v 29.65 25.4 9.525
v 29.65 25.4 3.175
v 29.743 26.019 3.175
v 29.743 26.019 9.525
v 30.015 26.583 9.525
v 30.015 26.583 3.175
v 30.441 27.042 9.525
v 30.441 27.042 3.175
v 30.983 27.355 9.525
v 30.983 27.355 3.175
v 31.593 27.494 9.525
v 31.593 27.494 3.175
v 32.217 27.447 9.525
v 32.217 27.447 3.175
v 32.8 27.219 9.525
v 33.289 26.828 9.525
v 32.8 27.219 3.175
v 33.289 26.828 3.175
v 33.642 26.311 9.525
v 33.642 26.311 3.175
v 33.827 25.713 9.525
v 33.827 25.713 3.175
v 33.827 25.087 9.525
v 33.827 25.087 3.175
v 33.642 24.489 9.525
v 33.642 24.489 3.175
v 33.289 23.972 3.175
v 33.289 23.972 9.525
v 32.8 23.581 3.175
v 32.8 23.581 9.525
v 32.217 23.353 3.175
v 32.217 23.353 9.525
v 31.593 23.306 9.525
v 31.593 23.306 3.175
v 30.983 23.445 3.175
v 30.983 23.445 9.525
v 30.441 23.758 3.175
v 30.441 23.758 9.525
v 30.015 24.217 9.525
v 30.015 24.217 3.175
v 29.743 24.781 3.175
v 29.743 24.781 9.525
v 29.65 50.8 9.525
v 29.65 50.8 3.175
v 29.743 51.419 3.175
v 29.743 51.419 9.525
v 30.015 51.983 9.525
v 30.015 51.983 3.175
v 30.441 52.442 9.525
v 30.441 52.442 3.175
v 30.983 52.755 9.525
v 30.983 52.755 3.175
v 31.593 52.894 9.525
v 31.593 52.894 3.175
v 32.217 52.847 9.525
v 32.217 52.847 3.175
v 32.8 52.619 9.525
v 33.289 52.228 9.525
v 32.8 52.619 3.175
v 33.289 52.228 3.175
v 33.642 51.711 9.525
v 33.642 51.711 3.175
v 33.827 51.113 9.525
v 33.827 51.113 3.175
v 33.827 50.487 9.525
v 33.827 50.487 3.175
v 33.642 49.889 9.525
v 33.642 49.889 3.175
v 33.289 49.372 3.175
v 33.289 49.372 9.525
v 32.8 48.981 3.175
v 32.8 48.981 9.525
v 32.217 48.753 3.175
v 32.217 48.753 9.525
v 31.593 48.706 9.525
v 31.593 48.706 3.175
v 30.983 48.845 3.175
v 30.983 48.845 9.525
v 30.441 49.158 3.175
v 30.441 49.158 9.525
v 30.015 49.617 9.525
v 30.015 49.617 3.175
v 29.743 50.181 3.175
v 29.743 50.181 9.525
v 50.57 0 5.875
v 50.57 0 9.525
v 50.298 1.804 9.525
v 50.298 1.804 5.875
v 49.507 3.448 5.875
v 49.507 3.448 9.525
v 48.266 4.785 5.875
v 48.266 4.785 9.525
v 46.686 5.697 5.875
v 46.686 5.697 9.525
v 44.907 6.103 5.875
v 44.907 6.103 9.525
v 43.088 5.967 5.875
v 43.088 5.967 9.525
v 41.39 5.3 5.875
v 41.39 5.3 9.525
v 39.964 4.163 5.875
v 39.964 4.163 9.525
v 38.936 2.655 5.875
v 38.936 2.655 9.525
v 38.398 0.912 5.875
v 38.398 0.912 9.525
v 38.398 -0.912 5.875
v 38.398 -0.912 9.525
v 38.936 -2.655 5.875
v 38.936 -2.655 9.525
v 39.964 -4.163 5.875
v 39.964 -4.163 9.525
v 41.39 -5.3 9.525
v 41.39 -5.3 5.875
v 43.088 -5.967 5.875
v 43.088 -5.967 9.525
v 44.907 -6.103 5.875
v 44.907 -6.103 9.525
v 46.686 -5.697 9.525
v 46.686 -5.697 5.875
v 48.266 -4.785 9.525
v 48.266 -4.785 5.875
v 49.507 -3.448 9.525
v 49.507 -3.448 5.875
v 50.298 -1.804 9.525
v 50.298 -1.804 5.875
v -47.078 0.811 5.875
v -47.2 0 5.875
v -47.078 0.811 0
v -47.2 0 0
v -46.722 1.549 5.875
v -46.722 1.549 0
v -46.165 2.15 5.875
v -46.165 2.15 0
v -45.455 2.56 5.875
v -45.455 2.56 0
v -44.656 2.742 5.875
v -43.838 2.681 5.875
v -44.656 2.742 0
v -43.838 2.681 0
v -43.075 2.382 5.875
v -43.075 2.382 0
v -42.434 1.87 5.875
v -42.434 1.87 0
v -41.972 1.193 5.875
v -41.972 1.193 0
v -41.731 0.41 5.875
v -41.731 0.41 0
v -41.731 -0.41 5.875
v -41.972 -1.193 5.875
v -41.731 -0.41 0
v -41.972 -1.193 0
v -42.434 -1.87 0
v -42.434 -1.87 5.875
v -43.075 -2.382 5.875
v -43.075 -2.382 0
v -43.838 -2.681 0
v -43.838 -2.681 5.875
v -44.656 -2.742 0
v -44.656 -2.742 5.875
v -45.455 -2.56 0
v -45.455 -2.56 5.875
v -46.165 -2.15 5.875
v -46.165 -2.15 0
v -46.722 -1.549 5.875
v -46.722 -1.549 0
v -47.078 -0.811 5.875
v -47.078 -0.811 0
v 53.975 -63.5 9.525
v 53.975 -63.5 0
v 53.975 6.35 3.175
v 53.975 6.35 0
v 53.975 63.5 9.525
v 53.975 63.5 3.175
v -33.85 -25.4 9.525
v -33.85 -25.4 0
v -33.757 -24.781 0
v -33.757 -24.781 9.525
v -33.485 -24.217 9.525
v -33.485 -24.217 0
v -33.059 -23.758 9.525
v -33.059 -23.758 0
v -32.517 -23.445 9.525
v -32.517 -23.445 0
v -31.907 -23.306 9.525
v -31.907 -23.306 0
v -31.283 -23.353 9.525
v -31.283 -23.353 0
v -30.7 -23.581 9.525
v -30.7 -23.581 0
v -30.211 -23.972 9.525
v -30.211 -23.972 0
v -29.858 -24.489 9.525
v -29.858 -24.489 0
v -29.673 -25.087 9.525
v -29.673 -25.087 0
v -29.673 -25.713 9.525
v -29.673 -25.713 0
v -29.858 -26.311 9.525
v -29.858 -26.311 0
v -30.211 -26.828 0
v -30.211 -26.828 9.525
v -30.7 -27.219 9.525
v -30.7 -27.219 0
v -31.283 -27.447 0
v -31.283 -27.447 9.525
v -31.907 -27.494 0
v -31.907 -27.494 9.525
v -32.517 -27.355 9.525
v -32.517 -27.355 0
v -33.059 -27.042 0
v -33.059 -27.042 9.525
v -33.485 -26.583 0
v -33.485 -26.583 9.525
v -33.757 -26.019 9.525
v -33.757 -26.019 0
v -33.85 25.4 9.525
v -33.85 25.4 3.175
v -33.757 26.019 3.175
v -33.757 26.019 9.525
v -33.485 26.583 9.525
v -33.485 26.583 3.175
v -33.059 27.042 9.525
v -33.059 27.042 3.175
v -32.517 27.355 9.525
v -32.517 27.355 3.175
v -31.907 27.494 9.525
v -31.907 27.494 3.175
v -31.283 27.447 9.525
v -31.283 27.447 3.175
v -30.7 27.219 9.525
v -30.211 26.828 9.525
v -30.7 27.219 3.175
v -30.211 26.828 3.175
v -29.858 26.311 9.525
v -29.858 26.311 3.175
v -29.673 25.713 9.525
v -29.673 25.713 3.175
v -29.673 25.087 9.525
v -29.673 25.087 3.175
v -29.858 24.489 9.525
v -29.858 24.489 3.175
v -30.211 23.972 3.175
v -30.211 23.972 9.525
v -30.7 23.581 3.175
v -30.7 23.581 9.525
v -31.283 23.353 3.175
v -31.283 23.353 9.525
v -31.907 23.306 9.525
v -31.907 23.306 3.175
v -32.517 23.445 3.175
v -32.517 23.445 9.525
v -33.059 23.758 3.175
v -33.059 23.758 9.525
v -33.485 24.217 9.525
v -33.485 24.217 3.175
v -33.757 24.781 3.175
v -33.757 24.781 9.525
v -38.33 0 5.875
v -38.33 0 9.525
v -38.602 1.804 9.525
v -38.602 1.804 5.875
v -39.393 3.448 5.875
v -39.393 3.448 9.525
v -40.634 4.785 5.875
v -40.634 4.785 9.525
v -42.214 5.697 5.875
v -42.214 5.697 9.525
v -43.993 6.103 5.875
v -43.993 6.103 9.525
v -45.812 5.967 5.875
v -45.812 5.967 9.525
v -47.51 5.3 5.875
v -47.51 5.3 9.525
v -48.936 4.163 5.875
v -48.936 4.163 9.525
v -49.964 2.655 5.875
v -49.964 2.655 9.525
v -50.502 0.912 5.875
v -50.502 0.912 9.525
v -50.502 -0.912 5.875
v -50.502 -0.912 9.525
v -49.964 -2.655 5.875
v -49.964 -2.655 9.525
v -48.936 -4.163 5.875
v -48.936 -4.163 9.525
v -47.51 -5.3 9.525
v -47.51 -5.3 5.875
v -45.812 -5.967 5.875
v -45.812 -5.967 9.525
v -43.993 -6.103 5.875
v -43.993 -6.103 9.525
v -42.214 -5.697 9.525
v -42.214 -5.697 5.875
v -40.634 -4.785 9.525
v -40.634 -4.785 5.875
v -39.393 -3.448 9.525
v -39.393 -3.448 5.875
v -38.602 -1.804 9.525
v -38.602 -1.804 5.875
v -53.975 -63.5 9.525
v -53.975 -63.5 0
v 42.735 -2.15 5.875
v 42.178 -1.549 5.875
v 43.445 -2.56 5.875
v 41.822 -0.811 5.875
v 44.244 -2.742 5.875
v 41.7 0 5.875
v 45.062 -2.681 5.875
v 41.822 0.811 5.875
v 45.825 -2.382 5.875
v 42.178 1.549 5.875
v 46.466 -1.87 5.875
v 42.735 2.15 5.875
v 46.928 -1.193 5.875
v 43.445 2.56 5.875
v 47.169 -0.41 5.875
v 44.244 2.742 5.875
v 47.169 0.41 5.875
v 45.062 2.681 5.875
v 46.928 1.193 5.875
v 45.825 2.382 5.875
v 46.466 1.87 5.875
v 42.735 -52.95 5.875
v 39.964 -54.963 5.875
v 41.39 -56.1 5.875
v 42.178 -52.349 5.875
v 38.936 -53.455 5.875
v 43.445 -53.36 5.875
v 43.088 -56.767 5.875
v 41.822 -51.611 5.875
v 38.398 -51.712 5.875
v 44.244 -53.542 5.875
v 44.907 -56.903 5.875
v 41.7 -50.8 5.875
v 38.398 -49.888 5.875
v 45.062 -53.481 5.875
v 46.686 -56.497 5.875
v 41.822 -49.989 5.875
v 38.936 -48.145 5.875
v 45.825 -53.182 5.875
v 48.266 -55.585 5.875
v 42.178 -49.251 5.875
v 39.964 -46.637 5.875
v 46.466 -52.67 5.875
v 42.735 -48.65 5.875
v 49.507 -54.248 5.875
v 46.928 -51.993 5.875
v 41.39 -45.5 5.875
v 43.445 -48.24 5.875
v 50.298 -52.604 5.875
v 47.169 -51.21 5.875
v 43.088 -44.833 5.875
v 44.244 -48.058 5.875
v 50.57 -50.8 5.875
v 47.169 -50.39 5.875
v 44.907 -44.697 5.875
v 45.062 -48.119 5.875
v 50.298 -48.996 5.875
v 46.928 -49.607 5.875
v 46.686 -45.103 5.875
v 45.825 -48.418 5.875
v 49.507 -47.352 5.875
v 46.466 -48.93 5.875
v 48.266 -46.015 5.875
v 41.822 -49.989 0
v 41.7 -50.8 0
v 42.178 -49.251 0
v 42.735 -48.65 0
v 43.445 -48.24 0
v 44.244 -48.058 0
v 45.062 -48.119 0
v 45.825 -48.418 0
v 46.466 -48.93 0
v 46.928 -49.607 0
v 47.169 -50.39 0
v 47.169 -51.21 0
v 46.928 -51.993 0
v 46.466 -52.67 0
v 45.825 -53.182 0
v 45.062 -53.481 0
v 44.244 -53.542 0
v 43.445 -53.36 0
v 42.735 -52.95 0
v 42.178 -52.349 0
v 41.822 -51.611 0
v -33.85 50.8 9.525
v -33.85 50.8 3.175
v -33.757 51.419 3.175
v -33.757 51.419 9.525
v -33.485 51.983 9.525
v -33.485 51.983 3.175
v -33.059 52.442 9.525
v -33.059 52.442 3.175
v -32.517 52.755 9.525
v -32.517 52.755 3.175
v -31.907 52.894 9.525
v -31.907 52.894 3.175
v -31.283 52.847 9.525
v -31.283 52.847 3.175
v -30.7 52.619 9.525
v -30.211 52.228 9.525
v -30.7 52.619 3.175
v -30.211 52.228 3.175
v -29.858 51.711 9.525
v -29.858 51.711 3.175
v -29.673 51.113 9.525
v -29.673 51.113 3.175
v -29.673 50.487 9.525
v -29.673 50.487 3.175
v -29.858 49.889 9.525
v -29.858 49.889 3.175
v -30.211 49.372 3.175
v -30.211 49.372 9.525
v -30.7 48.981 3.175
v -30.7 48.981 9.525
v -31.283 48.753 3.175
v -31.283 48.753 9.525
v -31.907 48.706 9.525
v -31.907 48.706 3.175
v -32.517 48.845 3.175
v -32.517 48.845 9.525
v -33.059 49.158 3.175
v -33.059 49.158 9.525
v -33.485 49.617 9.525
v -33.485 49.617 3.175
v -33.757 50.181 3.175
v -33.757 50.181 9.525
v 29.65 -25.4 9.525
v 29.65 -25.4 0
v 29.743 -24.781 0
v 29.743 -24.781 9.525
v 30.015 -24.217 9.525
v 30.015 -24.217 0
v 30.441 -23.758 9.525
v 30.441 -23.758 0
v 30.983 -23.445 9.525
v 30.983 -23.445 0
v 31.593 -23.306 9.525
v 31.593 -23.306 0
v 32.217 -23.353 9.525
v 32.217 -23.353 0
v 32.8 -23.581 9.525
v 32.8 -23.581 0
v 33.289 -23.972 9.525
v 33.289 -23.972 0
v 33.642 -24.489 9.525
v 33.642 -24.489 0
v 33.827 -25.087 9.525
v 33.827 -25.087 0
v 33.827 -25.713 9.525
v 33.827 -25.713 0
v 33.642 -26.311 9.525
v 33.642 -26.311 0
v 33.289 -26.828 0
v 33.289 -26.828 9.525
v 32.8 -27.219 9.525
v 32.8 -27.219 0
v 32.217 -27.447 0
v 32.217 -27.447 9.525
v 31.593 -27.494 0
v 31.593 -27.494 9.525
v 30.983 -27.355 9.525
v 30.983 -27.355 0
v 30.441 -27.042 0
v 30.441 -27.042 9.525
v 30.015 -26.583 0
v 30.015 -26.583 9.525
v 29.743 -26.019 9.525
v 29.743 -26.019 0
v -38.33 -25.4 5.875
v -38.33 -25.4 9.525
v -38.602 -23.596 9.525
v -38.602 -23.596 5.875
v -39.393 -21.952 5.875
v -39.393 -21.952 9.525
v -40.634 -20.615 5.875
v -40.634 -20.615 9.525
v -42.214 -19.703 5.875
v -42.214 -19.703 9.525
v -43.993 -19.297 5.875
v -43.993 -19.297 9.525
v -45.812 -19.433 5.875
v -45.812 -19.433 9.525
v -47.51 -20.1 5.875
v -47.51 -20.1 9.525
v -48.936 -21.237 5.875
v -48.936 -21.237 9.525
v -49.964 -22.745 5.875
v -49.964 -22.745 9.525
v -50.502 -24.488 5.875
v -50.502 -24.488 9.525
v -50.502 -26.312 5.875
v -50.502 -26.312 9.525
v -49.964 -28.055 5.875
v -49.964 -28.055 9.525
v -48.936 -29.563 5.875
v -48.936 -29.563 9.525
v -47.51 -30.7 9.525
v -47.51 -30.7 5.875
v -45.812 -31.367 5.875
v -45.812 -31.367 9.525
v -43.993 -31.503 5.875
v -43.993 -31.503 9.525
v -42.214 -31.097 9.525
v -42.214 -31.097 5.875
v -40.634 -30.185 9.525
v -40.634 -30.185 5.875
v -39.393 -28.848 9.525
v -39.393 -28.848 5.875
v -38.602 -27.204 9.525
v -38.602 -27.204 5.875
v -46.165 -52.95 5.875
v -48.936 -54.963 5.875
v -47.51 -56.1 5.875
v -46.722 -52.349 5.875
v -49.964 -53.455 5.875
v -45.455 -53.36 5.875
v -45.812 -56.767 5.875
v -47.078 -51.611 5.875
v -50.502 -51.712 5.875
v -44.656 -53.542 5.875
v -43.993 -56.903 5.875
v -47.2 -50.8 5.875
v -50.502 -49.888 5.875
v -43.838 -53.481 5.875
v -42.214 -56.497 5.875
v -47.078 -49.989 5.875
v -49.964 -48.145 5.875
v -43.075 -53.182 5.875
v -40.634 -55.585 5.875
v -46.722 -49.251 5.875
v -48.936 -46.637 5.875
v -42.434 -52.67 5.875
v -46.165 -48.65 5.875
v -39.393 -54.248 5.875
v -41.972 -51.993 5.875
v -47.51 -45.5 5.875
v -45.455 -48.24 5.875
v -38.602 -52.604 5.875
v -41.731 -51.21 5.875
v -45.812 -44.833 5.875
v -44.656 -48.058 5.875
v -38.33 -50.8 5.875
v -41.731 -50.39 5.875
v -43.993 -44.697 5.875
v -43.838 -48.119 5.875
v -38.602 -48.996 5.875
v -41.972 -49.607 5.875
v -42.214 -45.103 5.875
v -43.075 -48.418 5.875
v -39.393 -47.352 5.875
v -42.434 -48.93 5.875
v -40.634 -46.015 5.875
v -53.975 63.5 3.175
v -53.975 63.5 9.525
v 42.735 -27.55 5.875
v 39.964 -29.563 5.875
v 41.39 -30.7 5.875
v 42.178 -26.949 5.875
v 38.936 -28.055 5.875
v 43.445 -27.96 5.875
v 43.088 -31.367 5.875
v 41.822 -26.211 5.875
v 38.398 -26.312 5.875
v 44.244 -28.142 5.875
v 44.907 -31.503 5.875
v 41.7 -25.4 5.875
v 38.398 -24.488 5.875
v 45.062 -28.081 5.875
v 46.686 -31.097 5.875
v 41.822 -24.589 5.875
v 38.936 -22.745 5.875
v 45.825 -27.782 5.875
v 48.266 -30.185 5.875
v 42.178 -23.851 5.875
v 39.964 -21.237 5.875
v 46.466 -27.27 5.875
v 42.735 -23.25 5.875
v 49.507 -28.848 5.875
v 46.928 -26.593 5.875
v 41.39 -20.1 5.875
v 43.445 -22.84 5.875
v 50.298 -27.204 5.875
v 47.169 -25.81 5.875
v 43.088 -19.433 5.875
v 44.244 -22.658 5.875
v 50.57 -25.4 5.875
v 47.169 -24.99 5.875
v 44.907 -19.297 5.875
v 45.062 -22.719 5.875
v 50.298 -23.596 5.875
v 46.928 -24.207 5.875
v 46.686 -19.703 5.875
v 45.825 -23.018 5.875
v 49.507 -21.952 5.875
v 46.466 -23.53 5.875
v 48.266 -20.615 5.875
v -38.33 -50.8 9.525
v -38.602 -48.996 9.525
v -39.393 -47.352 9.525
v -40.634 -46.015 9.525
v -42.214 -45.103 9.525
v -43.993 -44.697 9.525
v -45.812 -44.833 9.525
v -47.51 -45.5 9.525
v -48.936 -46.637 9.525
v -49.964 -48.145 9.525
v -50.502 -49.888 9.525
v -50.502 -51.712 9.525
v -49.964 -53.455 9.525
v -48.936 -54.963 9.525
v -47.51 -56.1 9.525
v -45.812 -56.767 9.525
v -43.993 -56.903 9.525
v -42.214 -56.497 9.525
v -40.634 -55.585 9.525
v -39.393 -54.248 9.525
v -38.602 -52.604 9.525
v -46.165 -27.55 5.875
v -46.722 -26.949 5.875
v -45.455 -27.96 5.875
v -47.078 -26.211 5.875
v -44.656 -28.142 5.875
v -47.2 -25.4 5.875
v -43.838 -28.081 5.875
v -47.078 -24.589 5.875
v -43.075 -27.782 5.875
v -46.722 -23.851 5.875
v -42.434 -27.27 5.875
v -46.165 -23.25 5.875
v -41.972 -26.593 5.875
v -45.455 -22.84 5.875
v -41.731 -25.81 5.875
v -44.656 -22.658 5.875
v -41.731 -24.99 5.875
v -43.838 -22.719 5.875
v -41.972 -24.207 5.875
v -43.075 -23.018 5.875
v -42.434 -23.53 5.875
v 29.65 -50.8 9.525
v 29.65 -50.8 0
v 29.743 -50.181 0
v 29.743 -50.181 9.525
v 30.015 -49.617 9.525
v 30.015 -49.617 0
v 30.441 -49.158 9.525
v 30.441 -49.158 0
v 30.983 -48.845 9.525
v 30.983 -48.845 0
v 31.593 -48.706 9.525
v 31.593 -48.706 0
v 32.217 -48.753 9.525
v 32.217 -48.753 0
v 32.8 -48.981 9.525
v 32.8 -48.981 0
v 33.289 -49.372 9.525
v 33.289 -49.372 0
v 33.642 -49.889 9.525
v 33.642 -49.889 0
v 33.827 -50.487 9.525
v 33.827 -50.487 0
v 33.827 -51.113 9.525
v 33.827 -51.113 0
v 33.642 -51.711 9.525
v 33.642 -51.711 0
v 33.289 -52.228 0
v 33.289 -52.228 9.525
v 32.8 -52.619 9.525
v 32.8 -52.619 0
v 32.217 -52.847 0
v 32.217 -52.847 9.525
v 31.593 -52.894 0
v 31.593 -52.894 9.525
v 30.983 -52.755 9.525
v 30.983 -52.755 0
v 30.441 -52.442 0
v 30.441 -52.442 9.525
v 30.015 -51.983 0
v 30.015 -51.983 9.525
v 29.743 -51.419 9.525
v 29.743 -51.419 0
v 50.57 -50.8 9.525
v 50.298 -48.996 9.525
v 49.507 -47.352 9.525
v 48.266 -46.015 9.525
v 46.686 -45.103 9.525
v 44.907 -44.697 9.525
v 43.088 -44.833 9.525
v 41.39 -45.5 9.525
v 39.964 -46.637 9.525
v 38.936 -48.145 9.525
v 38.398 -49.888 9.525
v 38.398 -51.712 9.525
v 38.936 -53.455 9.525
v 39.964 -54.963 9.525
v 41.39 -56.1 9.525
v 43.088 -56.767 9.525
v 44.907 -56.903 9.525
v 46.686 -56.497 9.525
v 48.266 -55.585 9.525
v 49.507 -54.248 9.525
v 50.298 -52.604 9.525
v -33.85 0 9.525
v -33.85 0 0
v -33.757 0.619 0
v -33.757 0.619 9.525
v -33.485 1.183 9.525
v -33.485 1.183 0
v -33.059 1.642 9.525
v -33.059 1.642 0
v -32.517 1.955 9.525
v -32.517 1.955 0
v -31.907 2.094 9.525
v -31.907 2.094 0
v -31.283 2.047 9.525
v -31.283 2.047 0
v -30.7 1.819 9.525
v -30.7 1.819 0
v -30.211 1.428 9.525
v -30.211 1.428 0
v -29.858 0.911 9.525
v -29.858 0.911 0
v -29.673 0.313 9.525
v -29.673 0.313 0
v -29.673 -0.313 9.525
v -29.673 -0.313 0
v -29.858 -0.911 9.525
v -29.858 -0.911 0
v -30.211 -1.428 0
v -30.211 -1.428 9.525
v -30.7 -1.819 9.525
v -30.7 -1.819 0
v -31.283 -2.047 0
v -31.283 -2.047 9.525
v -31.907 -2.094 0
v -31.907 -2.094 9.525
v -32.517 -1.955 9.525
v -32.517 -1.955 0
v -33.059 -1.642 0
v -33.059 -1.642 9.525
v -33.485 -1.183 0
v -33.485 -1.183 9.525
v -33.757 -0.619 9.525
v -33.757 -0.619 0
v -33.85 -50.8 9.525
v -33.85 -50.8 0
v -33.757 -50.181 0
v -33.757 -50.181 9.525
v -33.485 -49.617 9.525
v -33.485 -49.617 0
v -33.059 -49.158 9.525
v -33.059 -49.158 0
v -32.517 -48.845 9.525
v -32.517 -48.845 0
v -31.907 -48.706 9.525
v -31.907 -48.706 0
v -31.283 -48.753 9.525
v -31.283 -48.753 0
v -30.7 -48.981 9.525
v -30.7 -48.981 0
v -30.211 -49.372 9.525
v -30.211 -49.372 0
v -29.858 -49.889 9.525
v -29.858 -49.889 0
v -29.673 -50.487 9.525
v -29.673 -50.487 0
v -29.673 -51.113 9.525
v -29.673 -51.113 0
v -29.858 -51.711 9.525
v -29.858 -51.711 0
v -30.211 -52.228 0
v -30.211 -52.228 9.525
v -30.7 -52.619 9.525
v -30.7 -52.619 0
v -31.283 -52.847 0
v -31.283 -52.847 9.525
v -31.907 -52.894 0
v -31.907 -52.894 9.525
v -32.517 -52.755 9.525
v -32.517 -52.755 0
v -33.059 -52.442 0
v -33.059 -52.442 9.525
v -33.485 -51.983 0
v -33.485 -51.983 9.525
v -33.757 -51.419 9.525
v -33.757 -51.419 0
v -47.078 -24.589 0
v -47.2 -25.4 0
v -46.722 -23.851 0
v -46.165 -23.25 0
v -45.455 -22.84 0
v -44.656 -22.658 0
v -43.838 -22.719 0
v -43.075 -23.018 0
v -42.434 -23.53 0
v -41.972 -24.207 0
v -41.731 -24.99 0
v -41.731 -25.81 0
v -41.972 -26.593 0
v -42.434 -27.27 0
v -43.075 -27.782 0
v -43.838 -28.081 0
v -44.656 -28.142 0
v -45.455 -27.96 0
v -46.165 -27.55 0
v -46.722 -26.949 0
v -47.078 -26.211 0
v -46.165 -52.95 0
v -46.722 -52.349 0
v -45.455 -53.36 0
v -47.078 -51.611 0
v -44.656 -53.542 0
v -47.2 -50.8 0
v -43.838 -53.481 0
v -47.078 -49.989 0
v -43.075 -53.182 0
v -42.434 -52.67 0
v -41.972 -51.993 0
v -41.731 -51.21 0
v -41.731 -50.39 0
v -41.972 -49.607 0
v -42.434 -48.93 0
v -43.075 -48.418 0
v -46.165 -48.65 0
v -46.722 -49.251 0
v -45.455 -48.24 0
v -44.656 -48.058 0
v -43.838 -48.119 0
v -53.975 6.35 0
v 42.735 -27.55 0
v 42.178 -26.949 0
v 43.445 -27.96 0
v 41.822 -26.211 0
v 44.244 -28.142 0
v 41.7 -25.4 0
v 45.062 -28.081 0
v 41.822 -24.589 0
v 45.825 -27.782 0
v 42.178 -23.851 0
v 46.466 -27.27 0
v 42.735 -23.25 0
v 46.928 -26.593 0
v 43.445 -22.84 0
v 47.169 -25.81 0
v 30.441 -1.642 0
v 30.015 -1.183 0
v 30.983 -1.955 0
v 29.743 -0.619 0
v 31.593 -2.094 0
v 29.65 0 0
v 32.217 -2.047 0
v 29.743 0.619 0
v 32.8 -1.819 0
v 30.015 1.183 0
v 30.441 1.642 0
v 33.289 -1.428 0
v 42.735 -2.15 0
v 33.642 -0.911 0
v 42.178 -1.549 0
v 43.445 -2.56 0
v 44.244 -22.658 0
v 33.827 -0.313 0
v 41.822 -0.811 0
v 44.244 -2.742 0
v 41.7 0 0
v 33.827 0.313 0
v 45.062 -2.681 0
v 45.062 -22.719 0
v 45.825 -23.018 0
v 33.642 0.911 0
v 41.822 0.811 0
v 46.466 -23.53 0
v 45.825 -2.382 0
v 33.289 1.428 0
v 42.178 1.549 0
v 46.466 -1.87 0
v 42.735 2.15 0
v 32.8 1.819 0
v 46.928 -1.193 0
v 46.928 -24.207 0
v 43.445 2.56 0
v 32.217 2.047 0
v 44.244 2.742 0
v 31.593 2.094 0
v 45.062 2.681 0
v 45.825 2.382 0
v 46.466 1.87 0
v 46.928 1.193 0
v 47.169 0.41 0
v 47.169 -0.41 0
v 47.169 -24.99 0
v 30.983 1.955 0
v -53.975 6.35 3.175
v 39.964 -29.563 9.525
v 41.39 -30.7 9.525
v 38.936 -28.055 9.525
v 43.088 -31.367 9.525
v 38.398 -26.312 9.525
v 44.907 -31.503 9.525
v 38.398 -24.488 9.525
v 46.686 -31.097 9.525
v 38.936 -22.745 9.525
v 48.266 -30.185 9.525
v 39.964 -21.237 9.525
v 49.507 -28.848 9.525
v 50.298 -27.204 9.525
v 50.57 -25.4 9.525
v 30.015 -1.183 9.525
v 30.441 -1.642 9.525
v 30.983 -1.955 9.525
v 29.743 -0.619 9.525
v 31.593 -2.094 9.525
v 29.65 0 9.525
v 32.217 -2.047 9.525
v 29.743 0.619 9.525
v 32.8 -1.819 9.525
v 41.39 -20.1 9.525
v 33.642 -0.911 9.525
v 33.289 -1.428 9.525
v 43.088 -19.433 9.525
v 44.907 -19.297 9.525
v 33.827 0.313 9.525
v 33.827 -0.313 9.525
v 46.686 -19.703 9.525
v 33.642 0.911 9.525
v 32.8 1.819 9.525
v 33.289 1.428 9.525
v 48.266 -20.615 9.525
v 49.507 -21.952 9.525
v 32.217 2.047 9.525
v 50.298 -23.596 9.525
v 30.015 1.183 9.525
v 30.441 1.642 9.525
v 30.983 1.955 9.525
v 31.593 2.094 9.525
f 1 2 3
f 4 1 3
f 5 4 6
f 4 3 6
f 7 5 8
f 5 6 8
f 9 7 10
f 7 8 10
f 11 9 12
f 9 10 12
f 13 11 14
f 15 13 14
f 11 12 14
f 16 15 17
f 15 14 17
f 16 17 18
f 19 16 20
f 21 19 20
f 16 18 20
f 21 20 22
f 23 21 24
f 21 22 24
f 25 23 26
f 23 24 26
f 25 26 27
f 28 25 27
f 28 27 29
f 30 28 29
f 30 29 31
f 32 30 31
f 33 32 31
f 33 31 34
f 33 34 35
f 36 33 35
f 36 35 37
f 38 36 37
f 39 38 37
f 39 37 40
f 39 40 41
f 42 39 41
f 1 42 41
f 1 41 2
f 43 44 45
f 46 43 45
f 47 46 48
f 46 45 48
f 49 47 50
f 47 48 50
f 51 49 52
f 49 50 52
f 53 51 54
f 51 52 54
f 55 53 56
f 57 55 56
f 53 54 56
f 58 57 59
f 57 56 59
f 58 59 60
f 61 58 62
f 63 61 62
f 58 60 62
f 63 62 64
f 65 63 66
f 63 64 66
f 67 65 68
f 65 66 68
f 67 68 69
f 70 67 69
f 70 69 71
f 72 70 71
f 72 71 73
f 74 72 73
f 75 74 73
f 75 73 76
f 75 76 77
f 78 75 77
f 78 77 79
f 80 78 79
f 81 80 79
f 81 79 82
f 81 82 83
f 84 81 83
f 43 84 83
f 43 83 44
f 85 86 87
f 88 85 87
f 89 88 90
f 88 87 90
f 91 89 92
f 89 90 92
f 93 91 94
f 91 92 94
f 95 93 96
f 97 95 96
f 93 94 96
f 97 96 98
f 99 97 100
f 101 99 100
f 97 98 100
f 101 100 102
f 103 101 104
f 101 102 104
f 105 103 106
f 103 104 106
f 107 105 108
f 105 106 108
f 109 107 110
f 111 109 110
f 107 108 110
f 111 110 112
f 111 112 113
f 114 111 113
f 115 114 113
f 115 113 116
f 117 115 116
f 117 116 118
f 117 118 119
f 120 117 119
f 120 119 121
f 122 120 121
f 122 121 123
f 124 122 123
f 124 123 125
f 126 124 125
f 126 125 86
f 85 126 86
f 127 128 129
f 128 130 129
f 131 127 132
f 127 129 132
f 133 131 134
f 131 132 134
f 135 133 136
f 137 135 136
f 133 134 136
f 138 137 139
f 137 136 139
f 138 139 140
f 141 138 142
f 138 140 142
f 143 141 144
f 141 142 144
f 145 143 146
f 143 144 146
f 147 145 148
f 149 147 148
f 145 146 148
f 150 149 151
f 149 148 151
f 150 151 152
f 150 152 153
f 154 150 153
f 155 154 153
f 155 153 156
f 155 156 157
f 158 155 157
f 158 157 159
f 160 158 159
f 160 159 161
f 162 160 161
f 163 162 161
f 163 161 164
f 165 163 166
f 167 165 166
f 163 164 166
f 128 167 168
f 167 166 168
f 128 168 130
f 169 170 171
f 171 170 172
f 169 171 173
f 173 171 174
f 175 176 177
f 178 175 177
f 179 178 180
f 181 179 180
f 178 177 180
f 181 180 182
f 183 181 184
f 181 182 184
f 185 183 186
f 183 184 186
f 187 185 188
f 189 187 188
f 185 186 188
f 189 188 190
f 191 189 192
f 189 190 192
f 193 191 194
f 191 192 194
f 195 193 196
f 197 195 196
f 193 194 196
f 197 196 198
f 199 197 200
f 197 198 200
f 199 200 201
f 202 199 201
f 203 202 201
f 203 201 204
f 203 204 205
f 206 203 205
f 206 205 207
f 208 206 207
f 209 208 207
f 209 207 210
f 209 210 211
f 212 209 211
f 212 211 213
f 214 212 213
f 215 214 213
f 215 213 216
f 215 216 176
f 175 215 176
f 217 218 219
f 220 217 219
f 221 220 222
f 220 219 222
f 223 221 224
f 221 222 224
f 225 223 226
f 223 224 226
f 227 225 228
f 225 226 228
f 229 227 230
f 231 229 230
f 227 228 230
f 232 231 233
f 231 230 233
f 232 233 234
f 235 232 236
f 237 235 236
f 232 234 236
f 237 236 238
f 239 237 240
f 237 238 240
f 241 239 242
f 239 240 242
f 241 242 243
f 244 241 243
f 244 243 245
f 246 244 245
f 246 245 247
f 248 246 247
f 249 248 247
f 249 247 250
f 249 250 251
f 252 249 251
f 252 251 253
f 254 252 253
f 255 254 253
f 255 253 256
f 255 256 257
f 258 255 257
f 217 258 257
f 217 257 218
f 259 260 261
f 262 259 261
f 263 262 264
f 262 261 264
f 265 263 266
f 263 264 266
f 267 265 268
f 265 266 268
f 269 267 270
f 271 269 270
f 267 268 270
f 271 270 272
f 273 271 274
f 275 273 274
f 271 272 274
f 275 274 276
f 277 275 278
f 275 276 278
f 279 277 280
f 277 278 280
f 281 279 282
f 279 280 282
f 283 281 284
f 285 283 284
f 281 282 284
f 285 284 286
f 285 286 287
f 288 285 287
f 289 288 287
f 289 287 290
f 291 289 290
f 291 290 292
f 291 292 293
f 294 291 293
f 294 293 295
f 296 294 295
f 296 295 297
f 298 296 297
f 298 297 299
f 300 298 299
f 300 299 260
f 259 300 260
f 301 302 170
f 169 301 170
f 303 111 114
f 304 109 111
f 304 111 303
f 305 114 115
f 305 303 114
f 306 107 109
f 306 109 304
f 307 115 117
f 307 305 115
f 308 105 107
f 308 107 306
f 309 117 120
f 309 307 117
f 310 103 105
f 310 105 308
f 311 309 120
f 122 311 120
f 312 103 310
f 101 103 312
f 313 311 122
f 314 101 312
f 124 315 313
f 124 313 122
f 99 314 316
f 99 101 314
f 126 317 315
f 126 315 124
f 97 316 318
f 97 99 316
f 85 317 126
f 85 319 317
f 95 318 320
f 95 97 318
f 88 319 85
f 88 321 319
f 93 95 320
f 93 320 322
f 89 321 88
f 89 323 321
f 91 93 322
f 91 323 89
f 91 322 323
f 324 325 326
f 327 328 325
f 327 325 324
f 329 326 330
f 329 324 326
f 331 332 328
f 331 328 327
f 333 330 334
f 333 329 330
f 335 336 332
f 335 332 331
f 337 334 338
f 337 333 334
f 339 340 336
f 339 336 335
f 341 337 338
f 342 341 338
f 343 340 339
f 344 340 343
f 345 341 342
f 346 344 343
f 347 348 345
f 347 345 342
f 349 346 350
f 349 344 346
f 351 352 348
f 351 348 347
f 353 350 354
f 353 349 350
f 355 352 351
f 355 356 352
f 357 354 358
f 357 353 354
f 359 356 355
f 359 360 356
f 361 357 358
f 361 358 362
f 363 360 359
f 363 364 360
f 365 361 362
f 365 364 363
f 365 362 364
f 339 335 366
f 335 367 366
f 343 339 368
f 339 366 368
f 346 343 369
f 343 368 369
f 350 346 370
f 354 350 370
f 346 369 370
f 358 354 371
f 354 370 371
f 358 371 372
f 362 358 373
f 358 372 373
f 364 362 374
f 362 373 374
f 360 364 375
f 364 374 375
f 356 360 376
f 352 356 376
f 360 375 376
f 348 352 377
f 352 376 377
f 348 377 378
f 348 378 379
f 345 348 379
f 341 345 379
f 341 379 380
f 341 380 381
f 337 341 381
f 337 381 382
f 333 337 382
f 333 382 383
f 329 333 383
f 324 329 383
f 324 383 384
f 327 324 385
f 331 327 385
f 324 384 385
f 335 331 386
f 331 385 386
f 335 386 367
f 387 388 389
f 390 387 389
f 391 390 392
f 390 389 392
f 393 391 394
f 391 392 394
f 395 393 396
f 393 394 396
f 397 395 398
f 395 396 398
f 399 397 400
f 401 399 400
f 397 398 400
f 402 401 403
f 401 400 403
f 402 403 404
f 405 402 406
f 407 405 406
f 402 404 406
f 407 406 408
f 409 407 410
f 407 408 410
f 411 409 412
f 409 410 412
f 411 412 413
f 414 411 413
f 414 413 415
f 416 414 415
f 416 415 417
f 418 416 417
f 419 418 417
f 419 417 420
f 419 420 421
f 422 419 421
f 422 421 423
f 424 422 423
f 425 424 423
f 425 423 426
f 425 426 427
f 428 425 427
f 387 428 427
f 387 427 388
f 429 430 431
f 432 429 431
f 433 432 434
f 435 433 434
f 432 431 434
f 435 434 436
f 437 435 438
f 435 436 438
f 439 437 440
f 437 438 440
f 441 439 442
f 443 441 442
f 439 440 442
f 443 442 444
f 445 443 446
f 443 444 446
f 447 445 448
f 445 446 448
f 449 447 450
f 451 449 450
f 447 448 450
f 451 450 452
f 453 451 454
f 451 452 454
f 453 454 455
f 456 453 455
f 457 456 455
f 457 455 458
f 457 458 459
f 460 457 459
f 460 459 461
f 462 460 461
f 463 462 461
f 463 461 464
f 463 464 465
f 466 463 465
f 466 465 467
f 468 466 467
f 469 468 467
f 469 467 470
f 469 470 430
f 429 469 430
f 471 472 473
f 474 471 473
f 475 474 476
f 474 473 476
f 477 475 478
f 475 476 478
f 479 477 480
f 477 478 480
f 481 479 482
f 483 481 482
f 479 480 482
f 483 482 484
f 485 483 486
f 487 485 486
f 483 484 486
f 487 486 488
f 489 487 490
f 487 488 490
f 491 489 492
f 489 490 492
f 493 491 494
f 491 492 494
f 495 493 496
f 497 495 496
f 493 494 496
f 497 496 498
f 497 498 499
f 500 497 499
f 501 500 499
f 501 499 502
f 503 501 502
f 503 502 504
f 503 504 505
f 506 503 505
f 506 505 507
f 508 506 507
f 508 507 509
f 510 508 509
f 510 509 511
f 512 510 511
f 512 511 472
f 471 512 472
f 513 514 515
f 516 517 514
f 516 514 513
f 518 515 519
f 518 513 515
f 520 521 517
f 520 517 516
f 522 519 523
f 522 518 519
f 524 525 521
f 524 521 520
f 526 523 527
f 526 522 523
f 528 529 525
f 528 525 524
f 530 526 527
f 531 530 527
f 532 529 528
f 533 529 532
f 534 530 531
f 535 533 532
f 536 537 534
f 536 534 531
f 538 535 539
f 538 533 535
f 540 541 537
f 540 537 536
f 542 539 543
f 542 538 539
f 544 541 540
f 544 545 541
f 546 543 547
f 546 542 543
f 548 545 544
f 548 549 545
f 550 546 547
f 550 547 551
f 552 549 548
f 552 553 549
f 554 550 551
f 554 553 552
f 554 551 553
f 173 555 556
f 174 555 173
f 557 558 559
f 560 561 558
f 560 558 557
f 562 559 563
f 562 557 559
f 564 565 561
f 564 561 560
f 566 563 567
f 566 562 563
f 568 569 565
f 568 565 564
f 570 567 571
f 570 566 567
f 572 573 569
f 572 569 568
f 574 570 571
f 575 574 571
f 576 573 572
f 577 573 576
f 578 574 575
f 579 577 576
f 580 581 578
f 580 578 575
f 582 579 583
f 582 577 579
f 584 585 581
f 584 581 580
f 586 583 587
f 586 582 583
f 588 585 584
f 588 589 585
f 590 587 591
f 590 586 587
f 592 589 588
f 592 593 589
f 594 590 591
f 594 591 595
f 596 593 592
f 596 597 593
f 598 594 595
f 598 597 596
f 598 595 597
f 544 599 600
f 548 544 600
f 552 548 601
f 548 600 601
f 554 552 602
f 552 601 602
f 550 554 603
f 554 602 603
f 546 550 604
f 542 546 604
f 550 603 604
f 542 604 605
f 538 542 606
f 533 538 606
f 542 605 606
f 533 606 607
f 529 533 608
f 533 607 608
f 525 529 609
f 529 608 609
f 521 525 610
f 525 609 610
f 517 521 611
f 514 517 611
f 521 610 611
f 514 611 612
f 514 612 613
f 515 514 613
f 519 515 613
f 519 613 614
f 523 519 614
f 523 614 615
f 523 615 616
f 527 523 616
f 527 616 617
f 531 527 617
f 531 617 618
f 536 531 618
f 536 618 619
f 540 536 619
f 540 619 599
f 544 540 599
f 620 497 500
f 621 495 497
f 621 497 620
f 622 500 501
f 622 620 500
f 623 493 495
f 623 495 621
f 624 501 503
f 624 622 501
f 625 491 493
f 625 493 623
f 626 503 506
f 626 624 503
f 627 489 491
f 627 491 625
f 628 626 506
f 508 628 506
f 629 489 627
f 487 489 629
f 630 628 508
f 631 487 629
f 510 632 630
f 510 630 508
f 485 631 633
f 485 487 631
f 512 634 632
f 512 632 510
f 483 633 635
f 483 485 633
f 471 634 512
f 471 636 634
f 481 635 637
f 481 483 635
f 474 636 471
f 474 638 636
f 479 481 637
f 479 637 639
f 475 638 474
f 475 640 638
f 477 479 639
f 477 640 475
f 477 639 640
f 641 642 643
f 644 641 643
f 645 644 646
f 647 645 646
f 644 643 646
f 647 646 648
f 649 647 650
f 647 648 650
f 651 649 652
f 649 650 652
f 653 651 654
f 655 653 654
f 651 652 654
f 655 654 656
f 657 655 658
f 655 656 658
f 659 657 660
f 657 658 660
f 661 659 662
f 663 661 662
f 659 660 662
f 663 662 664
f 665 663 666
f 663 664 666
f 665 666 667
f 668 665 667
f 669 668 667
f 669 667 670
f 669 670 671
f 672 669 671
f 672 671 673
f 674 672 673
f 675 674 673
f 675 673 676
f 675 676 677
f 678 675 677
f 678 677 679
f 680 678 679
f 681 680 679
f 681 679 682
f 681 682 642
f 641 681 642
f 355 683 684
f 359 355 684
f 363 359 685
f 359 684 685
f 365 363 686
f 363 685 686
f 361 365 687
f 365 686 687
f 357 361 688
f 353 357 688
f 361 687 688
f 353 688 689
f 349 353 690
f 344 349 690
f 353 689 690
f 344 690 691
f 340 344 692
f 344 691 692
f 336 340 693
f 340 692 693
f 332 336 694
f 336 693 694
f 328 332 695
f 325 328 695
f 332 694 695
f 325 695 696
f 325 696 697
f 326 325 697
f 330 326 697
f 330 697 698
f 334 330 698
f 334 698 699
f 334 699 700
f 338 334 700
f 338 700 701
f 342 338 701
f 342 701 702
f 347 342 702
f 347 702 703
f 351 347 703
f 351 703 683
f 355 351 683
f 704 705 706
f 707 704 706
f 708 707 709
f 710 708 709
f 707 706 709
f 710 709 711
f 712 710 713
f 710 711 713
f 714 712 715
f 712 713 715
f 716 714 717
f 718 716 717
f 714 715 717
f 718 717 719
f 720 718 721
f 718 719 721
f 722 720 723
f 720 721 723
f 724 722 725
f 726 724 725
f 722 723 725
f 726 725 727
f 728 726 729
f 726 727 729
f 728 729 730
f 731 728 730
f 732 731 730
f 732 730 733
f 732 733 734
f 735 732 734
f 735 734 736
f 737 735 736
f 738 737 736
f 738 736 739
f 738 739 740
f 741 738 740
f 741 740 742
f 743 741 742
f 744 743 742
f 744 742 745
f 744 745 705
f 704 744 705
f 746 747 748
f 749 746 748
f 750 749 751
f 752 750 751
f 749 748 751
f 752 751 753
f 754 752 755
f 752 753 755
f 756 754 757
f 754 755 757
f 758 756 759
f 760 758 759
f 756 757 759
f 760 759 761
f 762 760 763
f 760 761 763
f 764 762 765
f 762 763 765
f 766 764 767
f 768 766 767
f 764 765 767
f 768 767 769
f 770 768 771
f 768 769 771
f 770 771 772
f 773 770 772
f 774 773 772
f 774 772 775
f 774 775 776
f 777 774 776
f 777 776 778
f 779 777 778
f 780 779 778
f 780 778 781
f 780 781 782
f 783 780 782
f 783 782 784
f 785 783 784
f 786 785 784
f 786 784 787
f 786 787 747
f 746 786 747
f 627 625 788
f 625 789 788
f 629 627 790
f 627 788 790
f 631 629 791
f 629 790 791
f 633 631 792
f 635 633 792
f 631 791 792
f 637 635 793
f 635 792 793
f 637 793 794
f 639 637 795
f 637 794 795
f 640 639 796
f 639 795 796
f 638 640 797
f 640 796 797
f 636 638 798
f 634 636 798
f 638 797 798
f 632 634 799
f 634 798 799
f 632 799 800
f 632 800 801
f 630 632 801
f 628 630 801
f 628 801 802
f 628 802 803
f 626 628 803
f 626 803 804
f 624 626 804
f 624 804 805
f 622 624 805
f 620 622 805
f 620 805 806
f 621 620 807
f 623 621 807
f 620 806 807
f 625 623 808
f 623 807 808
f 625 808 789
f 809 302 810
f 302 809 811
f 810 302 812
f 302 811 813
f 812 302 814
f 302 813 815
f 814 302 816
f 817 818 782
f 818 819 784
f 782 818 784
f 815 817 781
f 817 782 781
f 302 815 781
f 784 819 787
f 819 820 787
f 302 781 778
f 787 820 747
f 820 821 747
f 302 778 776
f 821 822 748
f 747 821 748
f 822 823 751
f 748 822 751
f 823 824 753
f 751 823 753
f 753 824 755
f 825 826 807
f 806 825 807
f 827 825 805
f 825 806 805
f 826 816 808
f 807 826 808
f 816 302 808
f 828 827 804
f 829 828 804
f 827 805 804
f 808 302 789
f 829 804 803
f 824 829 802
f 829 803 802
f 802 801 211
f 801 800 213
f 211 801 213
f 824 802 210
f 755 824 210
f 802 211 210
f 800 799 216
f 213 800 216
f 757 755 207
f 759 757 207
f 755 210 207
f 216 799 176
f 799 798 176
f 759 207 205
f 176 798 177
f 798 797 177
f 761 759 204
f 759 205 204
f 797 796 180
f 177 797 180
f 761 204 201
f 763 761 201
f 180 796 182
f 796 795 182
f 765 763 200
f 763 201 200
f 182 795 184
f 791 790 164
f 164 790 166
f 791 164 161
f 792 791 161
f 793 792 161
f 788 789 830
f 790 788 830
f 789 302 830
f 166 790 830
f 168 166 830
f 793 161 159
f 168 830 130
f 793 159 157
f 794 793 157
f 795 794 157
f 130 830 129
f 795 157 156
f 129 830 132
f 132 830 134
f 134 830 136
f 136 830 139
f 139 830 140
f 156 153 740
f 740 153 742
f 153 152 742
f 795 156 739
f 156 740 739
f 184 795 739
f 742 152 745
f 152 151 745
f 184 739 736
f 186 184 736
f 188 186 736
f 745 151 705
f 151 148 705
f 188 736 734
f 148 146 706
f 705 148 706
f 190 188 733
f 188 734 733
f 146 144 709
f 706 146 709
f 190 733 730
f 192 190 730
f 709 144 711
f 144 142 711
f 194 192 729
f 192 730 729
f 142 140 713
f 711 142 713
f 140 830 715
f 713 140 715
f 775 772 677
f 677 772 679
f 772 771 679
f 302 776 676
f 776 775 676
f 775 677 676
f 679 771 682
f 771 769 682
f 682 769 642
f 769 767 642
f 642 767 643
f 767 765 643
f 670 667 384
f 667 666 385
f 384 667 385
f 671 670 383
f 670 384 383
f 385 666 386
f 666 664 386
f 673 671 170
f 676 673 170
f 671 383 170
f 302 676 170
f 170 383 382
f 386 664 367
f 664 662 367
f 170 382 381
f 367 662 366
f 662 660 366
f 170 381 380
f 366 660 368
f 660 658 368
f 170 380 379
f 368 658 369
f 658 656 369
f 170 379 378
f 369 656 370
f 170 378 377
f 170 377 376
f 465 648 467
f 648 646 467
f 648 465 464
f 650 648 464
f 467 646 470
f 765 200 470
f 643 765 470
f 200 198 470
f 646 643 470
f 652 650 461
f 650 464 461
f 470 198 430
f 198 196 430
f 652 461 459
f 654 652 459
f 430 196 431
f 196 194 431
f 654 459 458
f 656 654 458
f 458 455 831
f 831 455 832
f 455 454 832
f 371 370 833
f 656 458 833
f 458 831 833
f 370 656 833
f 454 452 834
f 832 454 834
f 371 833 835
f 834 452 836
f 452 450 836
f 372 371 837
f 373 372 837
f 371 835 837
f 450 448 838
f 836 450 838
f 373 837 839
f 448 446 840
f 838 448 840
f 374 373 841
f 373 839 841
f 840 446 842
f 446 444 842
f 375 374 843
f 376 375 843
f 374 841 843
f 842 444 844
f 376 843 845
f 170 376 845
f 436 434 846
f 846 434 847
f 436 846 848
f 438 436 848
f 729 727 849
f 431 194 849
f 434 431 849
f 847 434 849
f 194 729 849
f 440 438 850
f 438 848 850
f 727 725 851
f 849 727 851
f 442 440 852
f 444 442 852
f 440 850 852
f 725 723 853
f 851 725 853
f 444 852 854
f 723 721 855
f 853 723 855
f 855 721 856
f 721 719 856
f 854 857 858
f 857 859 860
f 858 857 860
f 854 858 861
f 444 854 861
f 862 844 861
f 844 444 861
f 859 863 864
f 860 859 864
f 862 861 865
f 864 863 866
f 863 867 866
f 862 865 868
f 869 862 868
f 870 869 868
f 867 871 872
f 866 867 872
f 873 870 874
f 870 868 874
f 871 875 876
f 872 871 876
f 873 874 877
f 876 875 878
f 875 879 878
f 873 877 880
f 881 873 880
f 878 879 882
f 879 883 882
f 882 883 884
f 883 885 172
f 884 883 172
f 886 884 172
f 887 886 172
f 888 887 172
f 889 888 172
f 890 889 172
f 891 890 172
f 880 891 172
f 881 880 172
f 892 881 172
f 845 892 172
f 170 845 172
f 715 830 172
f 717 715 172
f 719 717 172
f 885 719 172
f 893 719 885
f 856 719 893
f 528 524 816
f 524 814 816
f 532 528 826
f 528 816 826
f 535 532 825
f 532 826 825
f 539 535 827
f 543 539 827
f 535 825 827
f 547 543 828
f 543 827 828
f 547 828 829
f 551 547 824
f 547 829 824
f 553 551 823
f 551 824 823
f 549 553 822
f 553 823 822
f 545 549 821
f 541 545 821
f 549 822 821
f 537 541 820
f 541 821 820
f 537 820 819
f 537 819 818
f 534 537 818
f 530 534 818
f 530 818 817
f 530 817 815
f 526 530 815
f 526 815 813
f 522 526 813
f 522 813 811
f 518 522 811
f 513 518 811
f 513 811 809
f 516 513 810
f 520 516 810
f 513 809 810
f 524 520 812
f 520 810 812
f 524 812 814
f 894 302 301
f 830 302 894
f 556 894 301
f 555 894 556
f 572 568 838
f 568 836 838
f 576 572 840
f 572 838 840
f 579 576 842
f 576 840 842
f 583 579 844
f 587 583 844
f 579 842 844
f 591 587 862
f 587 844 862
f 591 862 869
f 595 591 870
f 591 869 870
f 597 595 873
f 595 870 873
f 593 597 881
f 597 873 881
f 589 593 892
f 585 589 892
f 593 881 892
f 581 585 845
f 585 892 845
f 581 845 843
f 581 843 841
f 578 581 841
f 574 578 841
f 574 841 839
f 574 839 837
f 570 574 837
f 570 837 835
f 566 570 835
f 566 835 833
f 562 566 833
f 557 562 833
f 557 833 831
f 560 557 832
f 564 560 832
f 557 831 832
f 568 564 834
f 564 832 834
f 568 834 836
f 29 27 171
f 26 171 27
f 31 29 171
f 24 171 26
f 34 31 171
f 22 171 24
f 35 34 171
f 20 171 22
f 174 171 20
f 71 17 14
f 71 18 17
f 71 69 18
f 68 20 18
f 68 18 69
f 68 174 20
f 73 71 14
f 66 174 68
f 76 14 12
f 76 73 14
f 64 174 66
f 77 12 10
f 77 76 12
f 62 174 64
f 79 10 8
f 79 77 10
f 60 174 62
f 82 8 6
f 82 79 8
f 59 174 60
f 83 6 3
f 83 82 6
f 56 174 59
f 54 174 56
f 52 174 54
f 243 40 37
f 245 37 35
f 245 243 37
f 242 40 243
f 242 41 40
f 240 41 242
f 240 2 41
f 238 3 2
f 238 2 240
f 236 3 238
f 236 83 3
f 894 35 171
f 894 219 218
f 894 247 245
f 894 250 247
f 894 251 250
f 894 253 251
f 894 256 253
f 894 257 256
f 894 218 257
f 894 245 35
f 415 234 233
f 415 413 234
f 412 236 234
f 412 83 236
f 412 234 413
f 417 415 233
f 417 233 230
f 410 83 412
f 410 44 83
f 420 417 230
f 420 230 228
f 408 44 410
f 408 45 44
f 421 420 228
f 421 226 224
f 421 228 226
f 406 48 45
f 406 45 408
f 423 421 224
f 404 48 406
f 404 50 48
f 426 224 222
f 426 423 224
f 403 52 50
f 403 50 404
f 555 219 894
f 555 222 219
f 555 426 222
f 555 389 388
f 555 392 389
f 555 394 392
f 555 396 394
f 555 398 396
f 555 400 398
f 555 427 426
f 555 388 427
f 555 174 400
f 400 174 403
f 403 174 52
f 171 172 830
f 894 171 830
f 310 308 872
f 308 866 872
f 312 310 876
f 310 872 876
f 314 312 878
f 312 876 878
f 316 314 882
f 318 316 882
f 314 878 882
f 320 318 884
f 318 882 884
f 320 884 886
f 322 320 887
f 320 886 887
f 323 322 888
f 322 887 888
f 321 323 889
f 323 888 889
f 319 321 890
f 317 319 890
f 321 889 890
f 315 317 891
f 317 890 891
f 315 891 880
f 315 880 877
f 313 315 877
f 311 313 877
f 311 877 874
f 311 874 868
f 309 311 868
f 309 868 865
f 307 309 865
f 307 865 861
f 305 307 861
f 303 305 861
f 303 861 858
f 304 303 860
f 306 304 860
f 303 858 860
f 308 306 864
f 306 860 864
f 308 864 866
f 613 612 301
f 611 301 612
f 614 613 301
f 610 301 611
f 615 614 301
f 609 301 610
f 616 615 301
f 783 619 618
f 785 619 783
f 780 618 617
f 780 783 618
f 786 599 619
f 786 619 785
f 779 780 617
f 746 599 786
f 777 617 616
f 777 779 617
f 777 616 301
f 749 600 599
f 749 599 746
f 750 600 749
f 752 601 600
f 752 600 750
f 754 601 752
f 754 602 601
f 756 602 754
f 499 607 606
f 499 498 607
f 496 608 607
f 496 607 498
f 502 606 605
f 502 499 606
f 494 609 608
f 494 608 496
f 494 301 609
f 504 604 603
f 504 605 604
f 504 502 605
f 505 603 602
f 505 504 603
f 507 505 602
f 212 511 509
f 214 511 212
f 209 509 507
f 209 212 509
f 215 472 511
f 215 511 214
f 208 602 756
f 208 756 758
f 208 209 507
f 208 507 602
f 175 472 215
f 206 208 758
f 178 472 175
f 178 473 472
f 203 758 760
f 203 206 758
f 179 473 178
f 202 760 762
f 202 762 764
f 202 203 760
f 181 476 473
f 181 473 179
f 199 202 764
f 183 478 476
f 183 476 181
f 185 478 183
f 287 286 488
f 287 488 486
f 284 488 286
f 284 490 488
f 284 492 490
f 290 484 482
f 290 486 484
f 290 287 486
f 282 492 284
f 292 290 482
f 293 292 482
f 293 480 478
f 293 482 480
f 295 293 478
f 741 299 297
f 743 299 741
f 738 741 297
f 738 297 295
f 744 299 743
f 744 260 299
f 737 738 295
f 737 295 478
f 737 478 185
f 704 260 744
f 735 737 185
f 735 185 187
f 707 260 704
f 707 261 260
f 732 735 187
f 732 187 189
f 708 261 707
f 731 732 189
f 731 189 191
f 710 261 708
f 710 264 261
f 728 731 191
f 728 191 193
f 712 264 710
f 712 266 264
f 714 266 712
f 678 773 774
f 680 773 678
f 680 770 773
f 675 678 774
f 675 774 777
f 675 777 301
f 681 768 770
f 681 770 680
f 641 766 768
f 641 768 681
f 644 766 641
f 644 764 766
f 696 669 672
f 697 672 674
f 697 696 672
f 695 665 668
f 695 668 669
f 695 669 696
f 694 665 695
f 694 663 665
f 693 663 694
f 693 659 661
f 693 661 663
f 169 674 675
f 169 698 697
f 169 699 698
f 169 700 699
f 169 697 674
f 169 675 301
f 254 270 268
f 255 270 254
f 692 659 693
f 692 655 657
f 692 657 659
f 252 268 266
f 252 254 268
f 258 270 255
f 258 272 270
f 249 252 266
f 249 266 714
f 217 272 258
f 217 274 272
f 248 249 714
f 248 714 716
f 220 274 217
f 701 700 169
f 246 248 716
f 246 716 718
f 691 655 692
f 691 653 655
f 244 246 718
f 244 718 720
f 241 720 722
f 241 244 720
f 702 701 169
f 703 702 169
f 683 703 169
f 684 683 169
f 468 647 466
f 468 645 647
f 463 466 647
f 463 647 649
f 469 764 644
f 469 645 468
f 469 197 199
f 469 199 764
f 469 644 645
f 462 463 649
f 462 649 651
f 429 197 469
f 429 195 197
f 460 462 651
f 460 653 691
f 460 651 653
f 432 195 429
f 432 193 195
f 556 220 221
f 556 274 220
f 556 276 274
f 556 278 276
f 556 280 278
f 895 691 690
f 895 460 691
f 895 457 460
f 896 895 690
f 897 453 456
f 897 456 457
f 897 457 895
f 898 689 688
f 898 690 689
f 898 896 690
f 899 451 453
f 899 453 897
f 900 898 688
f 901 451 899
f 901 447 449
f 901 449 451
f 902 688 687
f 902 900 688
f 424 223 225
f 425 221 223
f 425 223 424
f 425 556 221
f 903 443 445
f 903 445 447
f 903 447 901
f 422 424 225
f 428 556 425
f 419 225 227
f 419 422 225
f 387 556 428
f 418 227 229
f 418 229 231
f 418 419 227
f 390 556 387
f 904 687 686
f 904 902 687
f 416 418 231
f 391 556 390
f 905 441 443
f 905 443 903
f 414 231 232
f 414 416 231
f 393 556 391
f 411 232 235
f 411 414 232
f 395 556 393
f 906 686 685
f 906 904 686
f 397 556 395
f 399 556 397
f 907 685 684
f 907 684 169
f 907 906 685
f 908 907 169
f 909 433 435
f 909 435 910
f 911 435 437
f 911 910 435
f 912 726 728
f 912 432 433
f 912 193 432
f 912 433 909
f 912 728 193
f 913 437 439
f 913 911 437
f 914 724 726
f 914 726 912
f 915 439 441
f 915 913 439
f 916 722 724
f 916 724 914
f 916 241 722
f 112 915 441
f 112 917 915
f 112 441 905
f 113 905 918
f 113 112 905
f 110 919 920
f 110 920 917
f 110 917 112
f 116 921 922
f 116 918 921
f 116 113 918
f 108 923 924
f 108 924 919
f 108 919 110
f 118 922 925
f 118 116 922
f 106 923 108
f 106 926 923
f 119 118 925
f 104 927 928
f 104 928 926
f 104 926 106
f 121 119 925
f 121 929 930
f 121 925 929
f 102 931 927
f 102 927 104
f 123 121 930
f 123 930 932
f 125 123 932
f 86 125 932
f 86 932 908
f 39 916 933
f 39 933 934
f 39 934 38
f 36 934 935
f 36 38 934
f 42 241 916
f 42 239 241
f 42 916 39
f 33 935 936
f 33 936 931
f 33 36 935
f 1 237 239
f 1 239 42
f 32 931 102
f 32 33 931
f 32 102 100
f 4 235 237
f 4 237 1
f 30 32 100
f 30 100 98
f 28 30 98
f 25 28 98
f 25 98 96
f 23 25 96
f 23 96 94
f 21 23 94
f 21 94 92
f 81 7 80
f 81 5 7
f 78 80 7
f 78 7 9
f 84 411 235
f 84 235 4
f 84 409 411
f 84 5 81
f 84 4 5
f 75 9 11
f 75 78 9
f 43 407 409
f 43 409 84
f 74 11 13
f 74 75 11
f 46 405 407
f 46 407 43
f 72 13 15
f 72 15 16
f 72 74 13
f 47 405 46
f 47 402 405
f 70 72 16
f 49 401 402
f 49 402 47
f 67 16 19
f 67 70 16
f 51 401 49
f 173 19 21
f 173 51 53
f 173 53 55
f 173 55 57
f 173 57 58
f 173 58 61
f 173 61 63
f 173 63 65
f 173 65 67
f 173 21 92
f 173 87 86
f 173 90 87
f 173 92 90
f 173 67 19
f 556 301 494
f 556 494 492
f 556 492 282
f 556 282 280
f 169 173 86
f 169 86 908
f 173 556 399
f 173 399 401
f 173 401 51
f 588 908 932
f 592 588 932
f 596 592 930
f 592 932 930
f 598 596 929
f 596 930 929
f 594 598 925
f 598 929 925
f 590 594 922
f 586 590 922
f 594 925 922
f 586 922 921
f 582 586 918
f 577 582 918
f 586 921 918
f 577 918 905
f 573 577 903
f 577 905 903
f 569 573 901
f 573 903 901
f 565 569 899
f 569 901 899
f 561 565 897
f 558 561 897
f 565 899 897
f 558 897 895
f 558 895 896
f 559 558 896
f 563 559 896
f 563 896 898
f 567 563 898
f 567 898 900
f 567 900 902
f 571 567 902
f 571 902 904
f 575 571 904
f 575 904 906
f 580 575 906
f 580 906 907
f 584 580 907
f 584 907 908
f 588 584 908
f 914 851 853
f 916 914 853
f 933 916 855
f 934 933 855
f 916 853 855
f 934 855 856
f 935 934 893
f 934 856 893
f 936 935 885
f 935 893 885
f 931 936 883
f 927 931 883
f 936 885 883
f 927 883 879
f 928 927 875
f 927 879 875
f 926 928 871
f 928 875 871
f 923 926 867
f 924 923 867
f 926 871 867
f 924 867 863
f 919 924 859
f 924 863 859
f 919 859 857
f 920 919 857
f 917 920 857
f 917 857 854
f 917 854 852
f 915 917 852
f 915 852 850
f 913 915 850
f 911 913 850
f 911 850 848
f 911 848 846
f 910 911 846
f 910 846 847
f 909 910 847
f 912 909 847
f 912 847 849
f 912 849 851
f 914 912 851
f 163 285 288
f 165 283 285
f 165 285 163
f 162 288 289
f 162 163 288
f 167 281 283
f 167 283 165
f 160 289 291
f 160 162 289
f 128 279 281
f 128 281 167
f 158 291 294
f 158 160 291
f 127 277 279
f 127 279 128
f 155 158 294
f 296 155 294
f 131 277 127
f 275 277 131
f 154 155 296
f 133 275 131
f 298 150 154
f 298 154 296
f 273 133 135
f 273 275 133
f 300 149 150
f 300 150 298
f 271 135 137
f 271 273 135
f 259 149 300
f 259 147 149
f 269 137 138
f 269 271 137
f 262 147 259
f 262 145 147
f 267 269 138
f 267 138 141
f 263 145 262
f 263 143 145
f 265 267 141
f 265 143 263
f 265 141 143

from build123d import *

# Parameters (mm, degrees)
SKETCH1_W                                    = 107.95
SKETCH1_H                                    = 127
EXTRUDE1_DEPTH                               = 9.525
CBORE_FOR_M5_HEX_HEAD_CAP_SCREW2_D           = 5.5
CBORE_FOR_M5_HEX_HEAD_CAP_SCREW2_CBORE_D     = 12.24
CBORE_FOR_M5_HEX_HEAD_CAP_SCREW2_CBORE_DEPTH = 3.65
LPATTERN5_COUNT                              = 3
LPATTERN5_PITCH                              = 25.4
LPATTERN6_COUNT                              = 2
LPATTERN6_PITCH                              = 88.9
LPATTERN6_COPY_1_D                           = 5.5
LPATTERN6_COPY_1_CBORE_D                     = 12.24
LPATTERN6_COPY_1_CBORE_DEPTH                 = 3.65
LPATTERN6_COPY_2_D                           = 5.5
LPATTERN6_COPY_2_CBORE_D                     = 12.24
LPATTERN6_COPY_2_CBORE_DEPTH                 = 3.65
M5X0_8_TAPPED_HOLE1_D                        = 4.2
LPATTERN7_COUNT                              = 5
LPATTERN7_PITCH                              = 25.4
LPATTERN8_COUNT                              = 2
LPATTERN8_PITCH                              = 63.5
LPATTERN8_COPY_1_D                           = 4.2
LPATTERN8_COPY_2_D                           = 4.2
LPATTERN8_COPY_3_D                           = 4.2
LPATTERN8_COPY_4_D                           = 4.2
SKETCH16_W                                   = 107.95
SKETCH16_H                                   = 57.15
EXTRUDE2_DEPTH                               = 3.175


with BuildPart() as part:
    # Sketch1 → Extrude1 (new body)
    with BuildSketch(Plane.XY):
        Rectangle(SKETCH1_W, SKETCH1_H)
    extrude(amount=EXTRUDE1_DEPTH)

    # CBORE for M5 Hex Head Cap Screw2 (through all)
    with Locations(Plane(origin=(-44.45, -50.8, 9.525), x_dir=(1, 0, 0), z_dir=(0, 0, 1))):
        with Locations((0, 0)):
            cbore_for_m5_hex_head_cap_screw2 = CounterBoreHole(CBORE_FOR_M5_HEX_HEAD_CAP_SCREW2_D / 2, CBORE_FOR_M5_HEX_HEAD_CAP_SCREW2_CBORE_D / 2, CBORE_FOR_M5_HEX_HEAD_CAP_SCREW2_CBORE_DEPTH)

    # LPattern5: CBORE for M5 Hex Head Cap Screw2 ×3
    with Locations(*[(0, i * LPATTERN5_PITCH, 0) for i in range(1, LPATTERN5_COUNT)]):
        add(cbore_for_m5_hex_head_cap_screw2, mode=Mode.SUBTRACT)

    # LPattern6: CBORE for M5 Hex Head Cap Screw2 ×2
    with Locations(*[(i * LPATTERN6_PITCH, 0, 0) for i in range(1, LPATTERN6_COUNT)]):
        add(cbore_for_m5_hex_head_cap_screw2, mode=Mode.SUBTRACT)

    # LPattern6 copy 1 (through all)
    with Locations(Plane(origin=(44.45, -25.4, 9.525), x_dir=(1, 0, 0), z_dir=(0, 0, 1))):
        with Locations((0, 0)):
            CounterBoreHole(LPATTERN6_COPY_1_D / 2, LPATTERN6_COPY_1_CBORE_D / 2, LPATTERN6_COPY_1_CBORE_DEPTH)

    # LPattern6 copy 2 (through all)
    with Locations(Plane(origin=(44.45, 0, 9.525), x_dir=(1, 0, 0), z_dir=(0, 0, 1))):
        with Locations((0, 0)):
            CounterBoreHole(LPATTERN6_COPY_2_D / 2, LPATTERN6_COPY_2_CBORE_D / 2, LPATTERN6_COPY_2_CBORE_DEPTH)

    # M5x0.8 Tapped Hole1 (through all)
    with Locations(Plane(origin=(-31.75, -50.8, 9.525), x_dir=(1, 0, 0), z_dir=(0, 0, 1))):
        with Locations((0, 0)):
            m5x0_8_tapped_hole1 = Hole(M5X0_8_TAPPED_HOLE1_D / 2)

    # LPattern7: M5x0.8 Tapped Hole1 ×5
    with Locations(*[(0, i * LPATTERN7_PITCH, 0) for i in range(1, LPATTERN7_COUNT)]):
        add(m5x0_8_tapped_hole1, mode=Mode.SUBTRACT)

    # LPattern8: M5x0.8 Tapped Hole1 ×2
    with Locations(*[(i * LPATTERN8_PITCH, 0, 0) for i in range(1, LPATTERN8_COUNT)]):
        add(m5x0_8_tapped_hole1, mode=Mode.SUBTRACT)

    # LPattern8 copy 1 (through all)
    with Locations(Plane(origin=(31.75, -25.4, 9.525), x_dir=(1, 0, 0), z_dir=(0, 0, 1))):
        with Locations((0, 0)):
            Hole(LPATTERN8_COPY_1_D / 2)

    # LPattern8 copy 2 (through all)
    with Locations(Plane(origin=(31.75, 0, 9.525), x_dir=(1, 0, 0), z_dir=(0, 0, 1))):
        with Locations((0, 0)):
            Hole(LPATTERN8_COPY_2_D / 2)

    # LPattern8 copy 3 (through all)
    with Locations(Plane(origin=(31.75, 25.4, 9.525), x_dir=(1, 0, 0), z_dir=(0, 0, 1))):
        with Locations((0, 0)):
            Hole(LPATTERN8_COPY_3_D / 2)

    # LPattern8 copy 4 (through all)
    with Locations(Plane(origin=(31.75, 50.8, 9.525), x_dir=(1, 0, 0), z_dir=(0, 0, 1))):
        with Locations((0, 0)):
            Hole(LPATTERN8_COPY_4_D / 2)

    # Sketch16 → Extrude2 (cut)
    with BuildSketch(Plane(origin=(0, 0, 0), x_dir=(-1, 0, 0), z_dir=(0, 0, -1))):
        with Locations((0, 34.925)):
            Rectangle(SKETCH16_W, SKETCH16_H)
    extrude(amount=-EXTRUDE2_DEPTH, mode=Mode.SUBTRACT)


solid = part.part
